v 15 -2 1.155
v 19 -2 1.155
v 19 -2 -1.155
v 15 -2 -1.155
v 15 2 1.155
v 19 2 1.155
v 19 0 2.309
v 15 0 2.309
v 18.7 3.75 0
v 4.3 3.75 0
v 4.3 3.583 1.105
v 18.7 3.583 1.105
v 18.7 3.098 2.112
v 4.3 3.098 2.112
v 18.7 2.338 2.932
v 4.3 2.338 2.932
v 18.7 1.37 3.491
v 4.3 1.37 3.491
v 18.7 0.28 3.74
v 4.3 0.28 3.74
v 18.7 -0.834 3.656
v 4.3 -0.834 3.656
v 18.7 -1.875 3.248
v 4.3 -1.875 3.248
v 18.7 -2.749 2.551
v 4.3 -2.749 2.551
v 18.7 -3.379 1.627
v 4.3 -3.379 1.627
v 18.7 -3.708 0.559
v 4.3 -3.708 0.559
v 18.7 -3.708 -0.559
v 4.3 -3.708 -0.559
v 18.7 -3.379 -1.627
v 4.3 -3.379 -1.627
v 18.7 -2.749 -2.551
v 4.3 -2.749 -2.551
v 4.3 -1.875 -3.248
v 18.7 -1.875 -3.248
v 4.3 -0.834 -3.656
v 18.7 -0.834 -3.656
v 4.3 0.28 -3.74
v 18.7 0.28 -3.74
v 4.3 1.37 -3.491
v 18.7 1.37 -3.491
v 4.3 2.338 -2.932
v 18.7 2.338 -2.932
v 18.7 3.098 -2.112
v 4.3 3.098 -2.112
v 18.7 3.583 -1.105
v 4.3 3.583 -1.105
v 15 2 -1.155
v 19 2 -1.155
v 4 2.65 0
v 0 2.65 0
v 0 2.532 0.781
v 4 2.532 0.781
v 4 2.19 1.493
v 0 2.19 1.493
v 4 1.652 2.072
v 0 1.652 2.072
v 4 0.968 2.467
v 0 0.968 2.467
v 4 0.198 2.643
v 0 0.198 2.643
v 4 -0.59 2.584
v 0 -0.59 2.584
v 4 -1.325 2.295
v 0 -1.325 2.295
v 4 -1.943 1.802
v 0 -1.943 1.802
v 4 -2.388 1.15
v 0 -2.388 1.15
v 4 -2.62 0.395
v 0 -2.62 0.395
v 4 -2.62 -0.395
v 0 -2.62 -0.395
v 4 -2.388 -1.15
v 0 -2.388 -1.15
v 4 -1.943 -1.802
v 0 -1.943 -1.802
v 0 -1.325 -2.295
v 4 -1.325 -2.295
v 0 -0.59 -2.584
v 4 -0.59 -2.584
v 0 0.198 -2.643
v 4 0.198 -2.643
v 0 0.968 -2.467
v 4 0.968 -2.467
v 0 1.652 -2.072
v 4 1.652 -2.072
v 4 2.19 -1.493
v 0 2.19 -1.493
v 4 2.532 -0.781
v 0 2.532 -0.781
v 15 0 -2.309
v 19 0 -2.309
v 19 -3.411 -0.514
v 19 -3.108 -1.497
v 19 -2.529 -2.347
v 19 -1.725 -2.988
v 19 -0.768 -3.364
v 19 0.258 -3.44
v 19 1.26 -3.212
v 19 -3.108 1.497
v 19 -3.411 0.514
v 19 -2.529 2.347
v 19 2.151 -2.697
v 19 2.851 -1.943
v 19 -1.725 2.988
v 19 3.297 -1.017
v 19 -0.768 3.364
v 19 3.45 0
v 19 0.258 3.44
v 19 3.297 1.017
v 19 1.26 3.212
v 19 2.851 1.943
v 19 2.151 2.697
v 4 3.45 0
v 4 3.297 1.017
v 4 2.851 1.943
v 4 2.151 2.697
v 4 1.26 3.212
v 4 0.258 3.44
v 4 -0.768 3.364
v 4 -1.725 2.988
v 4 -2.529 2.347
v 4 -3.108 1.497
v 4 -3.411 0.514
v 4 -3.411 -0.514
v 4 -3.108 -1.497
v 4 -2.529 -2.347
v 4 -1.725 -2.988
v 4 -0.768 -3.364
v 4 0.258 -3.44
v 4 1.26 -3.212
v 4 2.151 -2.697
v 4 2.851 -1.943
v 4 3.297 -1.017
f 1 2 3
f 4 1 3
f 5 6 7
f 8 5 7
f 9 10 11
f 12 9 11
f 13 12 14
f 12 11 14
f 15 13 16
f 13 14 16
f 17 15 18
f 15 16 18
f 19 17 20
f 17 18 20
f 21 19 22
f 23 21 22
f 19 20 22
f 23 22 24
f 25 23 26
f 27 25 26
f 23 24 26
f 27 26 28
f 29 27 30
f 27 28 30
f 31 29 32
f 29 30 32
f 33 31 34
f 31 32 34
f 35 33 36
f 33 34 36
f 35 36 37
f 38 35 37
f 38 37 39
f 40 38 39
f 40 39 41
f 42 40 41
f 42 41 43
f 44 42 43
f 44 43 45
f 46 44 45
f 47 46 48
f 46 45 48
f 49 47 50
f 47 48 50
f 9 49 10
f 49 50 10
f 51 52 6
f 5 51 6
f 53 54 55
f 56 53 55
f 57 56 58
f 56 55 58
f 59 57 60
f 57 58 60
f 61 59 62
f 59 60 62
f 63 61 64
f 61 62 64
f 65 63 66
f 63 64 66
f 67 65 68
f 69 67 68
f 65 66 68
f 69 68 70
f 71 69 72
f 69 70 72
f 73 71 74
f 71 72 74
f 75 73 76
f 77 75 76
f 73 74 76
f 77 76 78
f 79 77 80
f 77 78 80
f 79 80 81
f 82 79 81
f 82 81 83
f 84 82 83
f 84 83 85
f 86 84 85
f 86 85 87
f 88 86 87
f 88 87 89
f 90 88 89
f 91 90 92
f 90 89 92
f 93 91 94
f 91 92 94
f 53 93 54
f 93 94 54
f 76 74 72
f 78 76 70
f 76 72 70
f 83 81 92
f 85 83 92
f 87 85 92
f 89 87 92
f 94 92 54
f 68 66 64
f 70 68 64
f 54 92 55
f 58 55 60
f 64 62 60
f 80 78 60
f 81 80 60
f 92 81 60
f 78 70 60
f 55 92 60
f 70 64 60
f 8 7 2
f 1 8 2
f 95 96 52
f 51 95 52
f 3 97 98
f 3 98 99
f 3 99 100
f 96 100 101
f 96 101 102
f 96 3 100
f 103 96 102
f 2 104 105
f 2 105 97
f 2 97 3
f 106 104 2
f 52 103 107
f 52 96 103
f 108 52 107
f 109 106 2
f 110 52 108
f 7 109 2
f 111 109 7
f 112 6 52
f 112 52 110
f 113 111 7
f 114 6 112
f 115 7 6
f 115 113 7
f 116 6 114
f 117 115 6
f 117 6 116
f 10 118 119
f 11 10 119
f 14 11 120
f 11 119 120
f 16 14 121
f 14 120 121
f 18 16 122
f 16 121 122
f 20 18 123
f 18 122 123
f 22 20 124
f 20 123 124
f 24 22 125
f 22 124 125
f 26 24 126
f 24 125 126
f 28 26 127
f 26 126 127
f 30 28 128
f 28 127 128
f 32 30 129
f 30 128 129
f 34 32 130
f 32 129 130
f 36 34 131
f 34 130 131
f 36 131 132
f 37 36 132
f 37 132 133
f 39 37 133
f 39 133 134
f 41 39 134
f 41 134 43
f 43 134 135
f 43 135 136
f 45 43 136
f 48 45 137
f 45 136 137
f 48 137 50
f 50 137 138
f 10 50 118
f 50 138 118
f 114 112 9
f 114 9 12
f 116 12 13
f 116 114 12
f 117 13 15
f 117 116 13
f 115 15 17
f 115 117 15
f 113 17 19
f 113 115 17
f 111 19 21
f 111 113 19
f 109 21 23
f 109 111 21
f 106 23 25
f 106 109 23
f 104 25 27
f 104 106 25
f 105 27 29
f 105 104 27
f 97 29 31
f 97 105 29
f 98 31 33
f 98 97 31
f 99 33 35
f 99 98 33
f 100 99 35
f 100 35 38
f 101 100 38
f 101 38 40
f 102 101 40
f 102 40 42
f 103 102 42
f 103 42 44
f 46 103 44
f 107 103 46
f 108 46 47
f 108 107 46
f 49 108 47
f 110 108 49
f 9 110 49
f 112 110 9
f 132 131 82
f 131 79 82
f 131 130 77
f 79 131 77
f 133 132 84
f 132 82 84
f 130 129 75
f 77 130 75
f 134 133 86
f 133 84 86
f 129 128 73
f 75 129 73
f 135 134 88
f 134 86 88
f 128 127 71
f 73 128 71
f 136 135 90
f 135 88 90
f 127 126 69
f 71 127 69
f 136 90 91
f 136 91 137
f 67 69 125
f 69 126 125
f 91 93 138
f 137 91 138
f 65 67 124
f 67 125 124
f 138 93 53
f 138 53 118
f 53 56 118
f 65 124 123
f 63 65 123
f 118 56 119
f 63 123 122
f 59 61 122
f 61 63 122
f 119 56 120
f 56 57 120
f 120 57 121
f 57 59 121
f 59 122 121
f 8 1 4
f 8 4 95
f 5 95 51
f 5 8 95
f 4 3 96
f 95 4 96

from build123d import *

# Parameters (mm, degrees)
F0_R     = 2.65
F1_DEPTH = 4
F2_R     = 3.75
F3_DEPTH = 15
F5_DEPTH = 4
F6_SIZE  = 0.3


with BuildPart() as f1:
    # F0 (on Right) → F1 (new body)
    with BuildSketch(Plane.YZ):
        Circle(F0_R)
    extrude(amount=F1_DEPTH)

    # F2 (on face) → F3 (join)
    with BuildSketch(Plane.YZ.offset(4)):
        Circle(F2_R)
    extrude(amount=F3_DEPTH)

    # F4 (on face) → F5 (cut)
    with BuildSketch(Plane.YZ.offset(19)):
        Polygon((2, -1.154701), (2, 1.154701), (0, 2.309401), (-2, 1.154701), (-2, -1.154701), (0, -2.309401), align=None)
    extrude(amount=-F5_DEPTH, mode=Mode.SUBTRACT)

    # F6
    f6_edges = [f1.edges().sort_by_distance(p)[0] for p in [
        (19, -3.75, 0),
        (4, -3.75, 0),
    ]]
    chamfer(f6_edges, length=F6_SIZE)


solid = f1.part
